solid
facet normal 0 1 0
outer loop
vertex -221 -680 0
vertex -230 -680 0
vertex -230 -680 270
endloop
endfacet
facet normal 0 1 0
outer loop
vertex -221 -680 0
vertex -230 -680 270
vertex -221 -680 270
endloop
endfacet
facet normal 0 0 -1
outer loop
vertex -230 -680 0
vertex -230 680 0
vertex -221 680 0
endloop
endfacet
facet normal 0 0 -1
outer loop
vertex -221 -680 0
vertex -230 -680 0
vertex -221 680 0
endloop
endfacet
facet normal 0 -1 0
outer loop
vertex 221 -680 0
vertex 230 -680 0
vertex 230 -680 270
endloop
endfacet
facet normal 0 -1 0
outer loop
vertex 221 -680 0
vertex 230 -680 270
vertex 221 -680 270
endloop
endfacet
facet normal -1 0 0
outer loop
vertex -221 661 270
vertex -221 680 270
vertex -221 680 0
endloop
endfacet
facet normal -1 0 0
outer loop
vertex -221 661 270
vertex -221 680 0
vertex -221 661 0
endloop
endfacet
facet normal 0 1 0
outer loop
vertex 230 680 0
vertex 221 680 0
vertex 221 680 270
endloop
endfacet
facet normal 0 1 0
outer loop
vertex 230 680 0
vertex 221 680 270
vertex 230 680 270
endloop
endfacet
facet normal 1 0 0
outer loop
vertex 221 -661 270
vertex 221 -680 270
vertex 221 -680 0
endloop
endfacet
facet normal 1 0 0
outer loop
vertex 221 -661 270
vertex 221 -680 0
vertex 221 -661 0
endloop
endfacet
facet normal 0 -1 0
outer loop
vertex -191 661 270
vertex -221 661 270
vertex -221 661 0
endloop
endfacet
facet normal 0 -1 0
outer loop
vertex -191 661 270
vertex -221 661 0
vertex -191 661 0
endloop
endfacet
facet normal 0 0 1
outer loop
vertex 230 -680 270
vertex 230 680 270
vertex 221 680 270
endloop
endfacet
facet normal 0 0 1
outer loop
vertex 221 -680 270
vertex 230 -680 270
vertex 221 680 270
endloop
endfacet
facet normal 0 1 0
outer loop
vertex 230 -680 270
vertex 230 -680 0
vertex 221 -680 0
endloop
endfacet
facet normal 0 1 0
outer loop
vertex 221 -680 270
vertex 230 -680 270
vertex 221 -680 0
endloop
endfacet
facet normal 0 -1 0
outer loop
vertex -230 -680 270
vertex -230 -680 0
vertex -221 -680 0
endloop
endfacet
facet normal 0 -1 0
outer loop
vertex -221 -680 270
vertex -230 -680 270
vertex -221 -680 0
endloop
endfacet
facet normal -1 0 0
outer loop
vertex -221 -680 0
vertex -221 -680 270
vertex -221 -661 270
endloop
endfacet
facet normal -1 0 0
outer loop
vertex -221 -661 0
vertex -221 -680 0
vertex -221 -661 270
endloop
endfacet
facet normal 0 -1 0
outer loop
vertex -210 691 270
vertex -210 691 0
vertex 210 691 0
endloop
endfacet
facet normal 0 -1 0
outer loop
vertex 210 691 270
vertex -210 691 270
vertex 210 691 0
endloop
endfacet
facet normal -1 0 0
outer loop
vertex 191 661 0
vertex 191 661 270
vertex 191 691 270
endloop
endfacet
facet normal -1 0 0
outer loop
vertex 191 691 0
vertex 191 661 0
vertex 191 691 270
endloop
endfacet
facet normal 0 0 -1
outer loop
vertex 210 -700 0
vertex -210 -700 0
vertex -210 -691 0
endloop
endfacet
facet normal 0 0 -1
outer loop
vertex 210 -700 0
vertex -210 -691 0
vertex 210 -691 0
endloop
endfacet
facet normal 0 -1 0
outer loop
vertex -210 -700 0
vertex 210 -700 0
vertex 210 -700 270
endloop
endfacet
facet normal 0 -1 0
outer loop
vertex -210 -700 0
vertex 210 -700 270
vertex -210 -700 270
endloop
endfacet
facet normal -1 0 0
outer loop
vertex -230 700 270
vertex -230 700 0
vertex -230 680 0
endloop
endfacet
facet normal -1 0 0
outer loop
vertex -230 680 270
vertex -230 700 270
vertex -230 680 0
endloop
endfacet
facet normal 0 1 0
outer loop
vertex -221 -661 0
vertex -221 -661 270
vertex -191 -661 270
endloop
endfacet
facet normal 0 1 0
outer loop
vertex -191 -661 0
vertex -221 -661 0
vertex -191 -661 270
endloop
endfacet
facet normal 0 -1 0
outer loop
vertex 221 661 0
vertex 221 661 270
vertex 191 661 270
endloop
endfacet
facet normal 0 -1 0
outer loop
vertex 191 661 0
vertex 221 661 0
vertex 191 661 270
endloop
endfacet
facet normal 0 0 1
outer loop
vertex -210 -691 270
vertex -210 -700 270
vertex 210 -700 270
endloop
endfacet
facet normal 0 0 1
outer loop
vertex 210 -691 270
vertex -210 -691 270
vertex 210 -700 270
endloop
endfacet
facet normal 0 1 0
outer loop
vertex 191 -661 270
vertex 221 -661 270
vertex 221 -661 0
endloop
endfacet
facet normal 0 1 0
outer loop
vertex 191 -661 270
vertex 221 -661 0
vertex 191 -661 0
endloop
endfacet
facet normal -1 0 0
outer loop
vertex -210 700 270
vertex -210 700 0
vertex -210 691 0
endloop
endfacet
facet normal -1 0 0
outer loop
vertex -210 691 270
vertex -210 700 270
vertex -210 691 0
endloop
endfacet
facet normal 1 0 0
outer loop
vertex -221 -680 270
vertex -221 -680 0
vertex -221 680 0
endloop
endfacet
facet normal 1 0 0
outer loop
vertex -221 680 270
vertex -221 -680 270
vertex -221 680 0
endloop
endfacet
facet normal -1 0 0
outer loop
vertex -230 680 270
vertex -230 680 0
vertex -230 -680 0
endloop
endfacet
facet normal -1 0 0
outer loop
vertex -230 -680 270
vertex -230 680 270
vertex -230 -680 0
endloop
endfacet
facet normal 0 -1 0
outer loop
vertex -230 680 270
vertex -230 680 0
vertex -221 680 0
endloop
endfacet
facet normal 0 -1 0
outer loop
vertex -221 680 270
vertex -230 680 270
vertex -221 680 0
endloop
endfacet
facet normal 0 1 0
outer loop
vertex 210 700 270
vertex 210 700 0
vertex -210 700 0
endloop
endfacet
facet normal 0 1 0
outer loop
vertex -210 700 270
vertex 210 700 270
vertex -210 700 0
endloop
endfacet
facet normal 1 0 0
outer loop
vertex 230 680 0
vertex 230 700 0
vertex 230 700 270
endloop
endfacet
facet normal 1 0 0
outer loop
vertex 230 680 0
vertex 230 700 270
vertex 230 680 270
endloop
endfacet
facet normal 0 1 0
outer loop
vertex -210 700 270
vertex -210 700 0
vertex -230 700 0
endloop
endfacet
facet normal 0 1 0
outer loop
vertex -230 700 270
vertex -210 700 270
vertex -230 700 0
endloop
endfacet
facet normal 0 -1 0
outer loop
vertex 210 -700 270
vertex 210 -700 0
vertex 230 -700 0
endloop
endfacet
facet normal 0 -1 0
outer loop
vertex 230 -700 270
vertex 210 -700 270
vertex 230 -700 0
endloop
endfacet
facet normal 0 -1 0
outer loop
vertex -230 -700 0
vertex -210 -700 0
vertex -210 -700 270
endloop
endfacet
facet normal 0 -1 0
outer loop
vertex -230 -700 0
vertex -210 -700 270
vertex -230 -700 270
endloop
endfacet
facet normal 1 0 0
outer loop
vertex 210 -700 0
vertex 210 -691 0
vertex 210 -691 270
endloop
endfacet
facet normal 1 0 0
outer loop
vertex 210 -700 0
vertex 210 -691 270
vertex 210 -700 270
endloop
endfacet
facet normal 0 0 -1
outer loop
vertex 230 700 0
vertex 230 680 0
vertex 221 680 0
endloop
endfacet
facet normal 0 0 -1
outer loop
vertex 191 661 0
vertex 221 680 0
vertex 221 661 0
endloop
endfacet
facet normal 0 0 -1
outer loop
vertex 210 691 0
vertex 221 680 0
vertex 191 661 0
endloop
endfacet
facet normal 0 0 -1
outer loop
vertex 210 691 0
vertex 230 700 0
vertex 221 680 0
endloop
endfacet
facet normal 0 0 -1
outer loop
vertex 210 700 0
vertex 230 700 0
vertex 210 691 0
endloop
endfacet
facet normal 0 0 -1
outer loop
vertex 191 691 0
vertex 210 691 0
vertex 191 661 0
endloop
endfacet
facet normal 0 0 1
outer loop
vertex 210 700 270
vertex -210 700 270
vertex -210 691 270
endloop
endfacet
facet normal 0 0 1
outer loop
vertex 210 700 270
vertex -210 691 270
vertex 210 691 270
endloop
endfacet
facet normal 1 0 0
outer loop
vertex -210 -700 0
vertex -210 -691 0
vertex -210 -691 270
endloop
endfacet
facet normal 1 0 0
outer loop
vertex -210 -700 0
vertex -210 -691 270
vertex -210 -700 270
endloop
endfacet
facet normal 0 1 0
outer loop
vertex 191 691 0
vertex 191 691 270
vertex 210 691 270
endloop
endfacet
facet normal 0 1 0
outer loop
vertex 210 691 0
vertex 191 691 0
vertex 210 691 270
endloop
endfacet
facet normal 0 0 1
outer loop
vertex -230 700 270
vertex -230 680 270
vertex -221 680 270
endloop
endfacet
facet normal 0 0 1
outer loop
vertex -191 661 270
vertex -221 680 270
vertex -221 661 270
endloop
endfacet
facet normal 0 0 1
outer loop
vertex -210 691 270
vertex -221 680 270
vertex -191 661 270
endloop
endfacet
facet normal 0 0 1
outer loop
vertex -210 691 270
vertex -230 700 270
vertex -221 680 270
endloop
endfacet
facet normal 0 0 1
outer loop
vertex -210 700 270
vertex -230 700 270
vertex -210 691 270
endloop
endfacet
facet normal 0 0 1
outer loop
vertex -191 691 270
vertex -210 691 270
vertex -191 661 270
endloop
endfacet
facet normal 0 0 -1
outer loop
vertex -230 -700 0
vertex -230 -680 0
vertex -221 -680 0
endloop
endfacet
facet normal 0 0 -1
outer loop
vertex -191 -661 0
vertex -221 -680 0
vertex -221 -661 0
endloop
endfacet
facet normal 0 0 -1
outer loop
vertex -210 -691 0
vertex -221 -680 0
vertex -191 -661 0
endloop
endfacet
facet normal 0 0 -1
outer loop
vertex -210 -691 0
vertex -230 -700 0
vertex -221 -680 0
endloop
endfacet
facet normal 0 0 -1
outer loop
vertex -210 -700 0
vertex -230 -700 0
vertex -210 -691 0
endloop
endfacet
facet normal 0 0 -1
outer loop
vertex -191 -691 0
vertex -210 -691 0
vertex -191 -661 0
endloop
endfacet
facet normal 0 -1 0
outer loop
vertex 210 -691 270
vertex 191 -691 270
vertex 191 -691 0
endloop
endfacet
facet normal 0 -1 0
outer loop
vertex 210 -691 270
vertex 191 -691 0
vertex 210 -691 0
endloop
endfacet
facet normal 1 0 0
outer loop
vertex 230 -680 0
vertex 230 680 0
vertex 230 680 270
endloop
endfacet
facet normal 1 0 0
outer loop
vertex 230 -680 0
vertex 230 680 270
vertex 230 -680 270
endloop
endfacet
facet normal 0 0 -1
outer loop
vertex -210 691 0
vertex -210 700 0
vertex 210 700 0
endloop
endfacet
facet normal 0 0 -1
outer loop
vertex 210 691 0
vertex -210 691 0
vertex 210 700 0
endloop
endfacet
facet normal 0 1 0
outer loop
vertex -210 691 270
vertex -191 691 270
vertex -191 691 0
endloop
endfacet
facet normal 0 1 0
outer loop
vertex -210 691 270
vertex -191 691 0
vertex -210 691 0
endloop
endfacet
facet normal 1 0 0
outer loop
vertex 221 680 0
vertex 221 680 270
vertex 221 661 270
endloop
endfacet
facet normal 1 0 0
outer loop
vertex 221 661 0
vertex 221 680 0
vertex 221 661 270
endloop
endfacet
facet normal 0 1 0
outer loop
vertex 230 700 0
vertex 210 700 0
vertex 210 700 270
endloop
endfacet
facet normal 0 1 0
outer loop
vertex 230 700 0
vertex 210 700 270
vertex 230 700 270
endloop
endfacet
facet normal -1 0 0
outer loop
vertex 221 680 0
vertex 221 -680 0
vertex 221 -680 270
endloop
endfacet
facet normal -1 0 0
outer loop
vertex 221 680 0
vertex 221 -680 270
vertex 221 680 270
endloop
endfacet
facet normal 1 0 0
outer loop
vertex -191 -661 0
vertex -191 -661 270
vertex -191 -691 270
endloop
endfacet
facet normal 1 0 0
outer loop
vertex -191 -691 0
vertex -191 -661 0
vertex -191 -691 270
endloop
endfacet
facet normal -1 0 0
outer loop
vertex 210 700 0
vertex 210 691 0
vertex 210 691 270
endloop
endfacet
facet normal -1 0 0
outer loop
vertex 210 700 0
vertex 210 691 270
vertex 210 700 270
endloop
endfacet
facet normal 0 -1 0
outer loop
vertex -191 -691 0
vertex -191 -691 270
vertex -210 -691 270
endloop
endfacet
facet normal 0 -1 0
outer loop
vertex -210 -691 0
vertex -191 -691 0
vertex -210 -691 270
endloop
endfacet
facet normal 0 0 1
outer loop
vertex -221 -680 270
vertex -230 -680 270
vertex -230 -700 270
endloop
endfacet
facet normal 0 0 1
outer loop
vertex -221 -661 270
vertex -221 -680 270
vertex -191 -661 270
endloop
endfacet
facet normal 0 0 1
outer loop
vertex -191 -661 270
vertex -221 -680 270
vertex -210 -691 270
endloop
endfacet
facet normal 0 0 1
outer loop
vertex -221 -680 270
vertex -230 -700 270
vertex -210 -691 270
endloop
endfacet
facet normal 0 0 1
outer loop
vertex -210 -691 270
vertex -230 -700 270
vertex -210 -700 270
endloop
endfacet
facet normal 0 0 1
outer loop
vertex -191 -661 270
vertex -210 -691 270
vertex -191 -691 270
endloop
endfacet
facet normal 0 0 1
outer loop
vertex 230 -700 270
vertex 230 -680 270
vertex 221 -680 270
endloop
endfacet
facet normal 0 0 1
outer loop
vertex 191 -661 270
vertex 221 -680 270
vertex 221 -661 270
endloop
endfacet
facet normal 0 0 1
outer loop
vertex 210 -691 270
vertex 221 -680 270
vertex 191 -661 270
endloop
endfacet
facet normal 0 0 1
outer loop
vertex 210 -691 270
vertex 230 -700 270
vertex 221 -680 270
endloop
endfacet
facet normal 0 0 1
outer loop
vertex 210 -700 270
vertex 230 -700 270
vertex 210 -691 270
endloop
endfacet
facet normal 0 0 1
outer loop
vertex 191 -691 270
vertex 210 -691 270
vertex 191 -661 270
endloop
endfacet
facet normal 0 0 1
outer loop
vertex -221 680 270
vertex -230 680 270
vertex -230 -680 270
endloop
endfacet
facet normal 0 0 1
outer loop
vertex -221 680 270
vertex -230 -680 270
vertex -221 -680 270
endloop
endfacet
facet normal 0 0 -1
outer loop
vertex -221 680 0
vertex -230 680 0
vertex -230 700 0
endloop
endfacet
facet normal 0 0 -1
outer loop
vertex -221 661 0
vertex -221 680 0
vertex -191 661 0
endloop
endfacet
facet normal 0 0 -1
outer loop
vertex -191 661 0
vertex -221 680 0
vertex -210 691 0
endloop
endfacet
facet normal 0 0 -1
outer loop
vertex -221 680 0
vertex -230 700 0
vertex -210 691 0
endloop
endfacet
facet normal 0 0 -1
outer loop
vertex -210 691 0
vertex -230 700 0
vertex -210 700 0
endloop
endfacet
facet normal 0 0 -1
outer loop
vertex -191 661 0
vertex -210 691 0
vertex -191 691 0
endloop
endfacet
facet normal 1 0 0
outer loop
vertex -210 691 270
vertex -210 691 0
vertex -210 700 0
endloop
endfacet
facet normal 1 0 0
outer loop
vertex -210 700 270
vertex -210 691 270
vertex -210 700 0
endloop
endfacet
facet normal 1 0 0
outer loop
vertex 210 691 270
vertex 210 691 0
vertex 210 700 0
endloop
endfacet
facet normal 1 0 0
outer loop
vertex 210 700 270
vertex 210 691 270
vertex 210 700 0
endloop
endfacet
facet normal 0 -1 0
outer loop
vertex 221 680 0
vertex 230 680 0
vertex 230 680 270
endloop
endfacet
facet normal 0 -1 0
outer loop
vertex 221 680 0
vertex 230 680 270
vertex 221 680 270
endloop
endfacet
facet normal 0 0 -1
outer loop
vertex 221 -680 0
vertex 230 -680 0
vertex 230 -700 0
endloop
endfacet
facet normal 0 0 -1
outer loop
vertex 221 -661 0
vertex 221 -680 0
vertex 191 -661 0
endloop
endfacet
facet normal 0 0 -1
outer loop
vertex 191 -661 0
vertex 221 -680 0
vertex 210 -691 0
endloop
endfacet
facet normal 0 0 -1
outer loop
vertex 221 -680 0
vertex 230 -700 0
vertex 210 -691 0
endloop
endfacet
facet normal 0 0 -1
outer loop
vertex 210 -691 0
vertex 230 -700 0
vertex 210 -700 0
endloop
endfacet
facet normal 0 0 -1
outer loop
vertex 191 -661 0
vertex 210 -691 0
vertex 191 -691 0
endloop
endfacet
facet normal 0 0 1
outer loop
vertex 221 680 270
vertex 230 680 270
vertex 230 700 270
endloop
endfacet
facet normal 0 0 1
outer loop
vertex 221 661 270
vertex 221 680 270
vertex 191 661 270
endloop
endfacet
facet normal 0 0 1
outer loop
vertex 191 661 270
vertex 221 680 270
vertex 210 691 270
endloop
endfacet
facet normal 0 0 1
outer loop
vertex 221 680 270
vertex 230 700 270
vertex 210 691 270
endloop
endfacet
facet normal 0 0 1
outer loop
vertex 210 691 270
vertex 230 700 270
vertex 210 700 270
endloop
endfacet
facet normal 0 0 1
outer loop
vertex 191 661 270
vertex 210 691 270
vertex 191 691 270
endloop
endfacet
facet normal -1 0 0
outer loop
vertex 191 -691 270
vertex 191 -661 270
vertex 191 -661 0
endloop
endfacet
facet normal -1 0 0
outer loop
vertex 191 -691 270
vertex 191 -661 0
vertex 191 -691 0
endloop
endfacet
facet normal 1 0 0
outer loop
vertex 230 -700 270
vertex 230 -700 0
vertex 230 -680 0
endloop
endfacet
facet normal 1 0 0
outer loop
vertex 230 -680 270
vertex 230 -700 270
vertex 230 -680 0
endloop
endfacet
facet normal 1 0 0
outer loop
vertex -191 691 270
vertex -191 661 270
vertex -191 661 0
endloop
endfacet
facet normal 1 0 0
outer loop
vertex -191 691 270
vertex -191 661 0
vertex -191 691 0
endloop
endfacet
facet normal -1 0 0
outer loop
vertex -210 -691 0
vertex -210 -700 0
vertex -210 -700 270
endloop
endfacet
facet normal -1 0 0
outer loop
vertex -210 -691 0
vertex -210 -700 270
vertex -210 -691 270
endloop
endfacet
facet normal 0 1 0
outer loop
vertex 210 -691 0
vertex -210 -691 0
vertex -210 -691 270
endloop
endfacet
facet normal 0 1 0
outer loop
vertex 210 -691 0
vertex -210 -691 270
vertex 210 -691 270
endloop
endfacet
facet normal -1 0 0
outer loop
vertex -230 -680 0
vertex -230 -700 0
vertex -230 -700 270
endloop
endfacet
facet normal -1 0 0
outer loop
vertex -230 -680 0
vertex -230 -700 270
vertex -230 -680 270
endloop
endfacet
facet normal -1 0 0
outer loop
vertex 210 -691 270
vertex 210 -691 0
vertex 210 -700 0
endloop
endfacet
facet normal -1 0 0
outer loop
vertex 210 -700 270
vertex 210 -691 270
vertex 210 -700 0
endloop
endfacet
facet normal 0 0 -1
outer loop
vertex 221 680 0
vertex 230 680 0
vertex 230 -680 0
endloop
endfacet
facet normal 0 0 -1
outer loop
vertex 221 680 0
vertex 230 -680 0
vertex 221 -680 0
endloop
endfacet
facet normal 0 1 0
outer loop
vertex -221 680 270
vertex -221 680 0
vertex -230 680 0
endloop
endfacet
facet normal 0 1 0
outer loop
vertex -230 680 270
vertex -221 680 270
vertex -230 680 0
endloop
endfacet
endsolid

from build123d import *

# Parameters (mm, degrees)
F2_DEPTH = 270
F5_DEPTH = 270
F7_DEPTH = 270


with BuildPart() as f2:
    # F0 (on Top) → F2 (new body)
    with BuildSketch(Plane.XY):
        Polygon((-210, 700), (-230, 700), (-230, 680), (-221, 680), (-221, 661), (-191, 661), (-191, 691), (-210, 691), align=None)
    extrude(amount=F2_DEPTH)


with BuildPart() as f3_1:
    # F3: instance of F2
    add(f2.part.mirror(Plane.YZ))


with BuildPart() as f4_1:
    # F4: instance of F2
    add(f2.part.mirror(Plane.XZ))


with BuildPart() as f4_2:
    # F4: instance of F3_1
    add(f3_1.part.mirror(Plane.XZ))


with BuildPart() as f5:
    # F0 (on Top) → F5 (new body)
    with BuildSketch(Plane.XY):
        Polygon((-221, 680), (-230, 680), (-230, -680), (-221, -680), (-221, -661), (-221, 661), align=None)
    extrude(amount=F5_DEPTH)


with BuildPart() as f6_1:
    # F6: instance of F5
    add(f5.part.mirror(Plane.YZ))


with BuildPart() as f7:
    # F0 (on Top) → F7 (new body)
    with BuildSketch(Plane.XY):
        Polygon((210, 700), (-210, 700), (-210, 691), (-191, 691), (191, 691), (210, 691), align=None)
    extrude(amount=F7_DEPTH)


with BuildPart() as f8_1:
    # F8: instance of F7
    add(f7.part.mirror(Plane.XZ))


solid = Compound([f2.part, f3_1.part, f4_1.part, f4_2.part, f5.part, f6_1.part, f7.part, f8_1.part])
